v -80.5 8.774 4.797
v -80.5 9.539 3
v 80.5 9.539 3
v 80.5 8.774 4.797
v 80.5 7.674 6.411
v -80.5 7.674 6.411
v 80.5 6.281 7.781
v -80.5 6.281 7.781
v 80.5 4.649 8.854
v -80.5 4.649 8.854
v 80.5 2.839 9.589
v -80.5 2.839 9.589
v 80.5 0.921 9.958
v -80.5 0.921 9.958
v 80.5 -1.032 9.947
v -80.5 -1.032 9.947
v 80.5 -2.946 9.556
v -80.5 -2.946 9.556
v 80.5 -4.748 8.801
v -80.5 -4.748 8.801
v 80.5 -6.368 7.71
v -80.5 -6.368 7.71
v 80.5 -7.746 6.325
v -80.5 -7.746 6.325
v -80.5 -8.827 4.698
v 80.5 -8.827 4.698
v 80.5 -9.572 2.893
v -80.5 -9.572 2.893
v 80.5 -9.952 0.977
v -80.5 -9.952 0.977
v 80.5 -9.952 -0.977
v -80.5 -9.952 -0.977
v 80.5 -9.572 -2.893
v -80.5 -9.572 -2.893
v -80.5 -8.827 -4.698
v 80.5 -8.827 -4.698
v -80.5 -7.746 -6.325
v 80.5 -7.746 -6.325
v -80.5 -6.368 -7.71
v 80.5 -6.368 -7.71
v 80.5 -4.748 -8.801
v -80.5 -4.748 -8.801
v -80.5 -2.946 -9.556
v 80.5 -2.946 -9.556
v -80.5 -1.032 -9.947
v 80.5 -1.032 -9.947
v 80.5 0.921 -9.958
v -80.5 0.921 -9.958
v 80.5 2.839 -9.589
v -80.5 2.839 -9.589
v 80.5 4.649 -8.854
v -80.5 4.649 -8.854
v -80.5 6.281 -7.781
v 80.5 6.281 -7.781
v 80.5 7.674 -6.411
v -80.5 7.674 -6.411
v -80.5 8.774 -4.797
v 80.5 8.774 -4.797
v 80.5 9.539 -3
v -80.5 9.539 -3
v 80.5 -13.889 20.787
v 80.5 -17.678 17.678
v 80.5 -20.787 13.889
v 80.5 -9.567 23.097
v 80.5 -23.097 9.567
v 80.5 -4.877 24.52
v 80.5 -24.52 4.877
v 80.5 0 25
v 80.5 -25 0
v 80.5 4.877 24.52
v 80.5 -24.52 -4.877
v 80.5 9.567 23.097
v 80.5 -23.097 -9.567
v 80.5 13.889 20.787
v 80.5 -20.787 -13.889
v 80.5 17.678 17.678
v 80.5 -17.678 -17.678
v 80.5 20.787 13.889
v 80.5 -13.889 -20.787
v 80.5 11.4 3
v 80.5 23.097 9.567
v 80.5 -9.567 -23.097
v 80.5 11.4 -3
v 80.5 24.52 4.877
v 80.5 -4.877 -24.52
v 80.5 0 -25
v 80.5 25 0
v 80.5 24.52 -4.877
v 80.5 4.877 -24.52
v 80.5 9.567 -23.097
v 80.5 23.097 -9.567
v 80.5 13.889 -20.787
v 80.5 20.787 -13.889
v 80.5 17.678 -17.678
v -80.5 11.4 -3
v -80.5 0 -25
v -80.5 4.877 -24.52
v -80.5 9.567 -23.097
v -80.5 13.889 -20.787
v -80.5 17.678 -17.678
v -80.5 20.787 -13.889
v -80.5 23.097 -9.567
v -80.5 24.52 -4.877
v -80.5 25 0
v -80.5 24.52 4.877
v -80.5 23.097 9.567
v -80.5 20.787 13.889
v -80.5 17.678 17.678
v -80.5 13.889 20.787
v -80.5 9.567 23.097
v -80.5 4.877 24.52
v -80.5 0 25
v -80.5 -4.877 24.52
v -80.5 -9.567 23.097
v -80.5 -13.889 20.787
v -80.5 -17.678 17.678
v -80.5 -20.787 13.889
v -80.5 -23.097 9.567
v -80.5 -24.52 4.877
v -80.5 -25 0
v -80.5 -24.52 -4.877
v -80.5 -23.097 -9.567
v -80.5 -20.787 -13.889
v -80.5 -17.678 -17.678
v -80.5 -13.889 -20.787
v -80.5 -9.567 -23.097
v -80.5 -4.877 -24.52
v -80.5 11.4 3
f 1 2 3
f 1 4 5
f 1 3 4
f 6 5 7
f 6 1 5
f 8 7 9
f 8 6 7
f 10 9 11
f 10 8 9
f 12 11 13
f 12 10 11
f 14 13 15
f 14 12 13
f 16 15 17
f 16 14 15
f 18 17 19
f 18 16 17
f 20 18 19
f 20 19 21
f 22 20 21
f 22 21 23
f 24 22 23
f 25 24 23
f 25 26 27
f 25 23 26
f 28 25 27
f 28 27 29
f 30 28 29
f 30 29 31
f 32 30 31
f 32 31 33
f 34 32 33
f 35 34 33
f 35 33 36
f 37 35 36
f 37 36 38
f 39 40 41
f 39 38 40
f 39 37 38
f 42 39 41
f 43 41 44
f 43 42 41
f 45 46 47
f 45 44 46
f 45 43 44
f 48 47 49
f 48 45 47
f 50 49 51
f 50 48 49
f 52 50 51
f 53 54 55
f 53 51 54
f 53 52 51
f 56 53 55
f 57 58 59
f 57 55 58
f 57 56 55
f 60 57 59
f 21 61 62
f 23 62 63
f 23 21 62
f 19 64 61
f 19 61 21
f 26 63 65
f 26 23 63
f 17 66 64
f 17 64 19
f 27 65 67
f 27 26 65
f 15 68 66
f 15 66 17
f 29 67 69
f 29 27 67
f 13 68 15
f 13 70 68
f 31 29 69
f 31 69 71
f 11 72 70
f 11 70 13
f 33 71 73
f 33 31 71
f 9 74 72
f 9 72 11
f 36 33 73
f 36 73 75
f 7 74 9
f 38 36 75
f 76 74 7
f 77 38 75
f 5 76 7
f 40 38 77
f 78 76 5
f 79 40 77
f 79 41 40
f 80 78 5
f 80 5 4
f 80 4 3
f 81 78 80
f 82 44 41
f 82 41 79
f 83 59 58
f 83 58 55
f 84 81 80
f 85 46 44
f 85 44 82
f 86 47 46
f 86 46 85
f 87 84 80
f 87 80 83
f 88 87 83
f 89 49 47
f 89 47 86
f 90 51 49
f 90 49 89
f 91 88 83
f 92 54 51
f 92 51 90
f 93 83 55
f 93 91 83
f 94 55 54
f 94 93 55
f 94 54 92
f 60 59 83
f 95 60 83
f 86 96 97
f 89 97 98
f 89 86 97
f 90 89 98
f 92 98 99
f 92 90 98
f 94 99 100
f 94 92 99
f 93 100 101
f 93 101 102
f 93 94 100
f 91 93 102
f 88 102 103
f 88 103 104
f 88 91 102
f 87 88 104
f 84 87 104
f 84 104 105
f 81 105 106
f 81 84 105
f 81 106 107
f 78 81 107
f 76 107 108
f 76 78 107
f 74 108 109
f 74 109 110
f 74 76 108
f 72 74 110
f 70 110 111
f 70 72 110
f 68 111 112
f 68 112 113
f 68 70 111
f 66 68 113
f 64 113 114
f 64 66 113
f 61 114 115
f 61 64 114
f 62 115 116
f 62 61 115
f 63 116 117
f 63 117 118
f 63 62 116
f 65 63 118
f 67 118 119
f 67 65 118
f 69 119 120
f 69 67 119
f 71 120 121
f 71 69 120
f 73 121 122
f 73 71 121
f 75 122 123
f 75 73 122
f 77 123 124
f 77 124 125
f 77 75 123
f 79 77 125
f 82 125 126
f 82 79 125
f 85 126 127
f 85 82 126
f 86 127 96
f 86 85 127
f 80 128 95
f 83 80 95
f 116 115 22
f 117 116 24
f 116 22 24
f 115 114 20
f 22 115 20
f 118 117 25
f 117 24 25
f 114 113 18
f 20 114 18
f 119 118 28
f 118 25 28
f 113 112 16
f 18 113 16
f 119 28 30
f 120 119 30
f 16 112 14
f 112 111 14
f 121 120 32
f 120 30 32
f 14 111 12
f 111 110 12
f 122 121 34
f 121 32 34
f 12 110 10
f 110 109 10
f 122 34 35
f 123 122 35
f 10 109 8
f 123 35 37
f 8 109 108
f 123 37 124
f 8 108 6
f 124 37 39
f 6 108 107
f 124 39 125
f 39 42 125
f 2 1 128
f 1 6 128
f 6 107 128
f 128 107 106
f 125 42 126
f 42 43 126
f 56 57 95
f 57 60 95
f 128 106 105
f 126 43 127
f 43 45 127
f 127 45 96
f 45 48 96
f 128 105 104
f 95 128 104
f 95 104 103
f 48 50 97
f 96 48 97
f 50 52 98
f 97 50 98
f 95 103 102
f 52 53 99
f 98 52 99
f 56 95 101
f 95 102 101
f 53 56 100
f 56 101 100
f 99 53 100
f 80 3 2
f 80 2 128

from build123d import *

# Parameters (mm, degrees)
SKETCH1_R           = 25
SKETCH1_R_2         = 10
BOSS_EXTRUDE1_DEPTH = 80.5
SKETCH3_W           = 6
SKETCH3_H           = 2.8
CUT_EXTRUDE1_DEPTH  = 80.5


with BuildPart() as part:
    # Sketch1 → Boss-Extrude1 (new, symmetric)
    with BuildSketch(Plane(origin=(0, 0, 0), x_dir=(0, 0, -1), z_dir=(1, 0, 0))):
        Circle(SKETCH1_R)
        Circle(SKETCH1_R_2, mode=Mode.SUBTRACT)
    extrude(amount=BOSS_EXTRUDE1_DEPTH, both=True)

    # Sketch3 → Cut-Extrude1 (cut, symmetric)
    with BuildSketch(Plane(origin=(0, 0, 0), x_dir=(0, 0, -1), z_dir=(1, 0, 0))):
        with Locations((0, 10)):
            Rectangle(SKETCH3_W, SKETCH3_H)
    extrude(amount=CUT_EXTRUDE1_DEPTH, both=True, mode=Mode.SUBTRACT)


solid = part.part
